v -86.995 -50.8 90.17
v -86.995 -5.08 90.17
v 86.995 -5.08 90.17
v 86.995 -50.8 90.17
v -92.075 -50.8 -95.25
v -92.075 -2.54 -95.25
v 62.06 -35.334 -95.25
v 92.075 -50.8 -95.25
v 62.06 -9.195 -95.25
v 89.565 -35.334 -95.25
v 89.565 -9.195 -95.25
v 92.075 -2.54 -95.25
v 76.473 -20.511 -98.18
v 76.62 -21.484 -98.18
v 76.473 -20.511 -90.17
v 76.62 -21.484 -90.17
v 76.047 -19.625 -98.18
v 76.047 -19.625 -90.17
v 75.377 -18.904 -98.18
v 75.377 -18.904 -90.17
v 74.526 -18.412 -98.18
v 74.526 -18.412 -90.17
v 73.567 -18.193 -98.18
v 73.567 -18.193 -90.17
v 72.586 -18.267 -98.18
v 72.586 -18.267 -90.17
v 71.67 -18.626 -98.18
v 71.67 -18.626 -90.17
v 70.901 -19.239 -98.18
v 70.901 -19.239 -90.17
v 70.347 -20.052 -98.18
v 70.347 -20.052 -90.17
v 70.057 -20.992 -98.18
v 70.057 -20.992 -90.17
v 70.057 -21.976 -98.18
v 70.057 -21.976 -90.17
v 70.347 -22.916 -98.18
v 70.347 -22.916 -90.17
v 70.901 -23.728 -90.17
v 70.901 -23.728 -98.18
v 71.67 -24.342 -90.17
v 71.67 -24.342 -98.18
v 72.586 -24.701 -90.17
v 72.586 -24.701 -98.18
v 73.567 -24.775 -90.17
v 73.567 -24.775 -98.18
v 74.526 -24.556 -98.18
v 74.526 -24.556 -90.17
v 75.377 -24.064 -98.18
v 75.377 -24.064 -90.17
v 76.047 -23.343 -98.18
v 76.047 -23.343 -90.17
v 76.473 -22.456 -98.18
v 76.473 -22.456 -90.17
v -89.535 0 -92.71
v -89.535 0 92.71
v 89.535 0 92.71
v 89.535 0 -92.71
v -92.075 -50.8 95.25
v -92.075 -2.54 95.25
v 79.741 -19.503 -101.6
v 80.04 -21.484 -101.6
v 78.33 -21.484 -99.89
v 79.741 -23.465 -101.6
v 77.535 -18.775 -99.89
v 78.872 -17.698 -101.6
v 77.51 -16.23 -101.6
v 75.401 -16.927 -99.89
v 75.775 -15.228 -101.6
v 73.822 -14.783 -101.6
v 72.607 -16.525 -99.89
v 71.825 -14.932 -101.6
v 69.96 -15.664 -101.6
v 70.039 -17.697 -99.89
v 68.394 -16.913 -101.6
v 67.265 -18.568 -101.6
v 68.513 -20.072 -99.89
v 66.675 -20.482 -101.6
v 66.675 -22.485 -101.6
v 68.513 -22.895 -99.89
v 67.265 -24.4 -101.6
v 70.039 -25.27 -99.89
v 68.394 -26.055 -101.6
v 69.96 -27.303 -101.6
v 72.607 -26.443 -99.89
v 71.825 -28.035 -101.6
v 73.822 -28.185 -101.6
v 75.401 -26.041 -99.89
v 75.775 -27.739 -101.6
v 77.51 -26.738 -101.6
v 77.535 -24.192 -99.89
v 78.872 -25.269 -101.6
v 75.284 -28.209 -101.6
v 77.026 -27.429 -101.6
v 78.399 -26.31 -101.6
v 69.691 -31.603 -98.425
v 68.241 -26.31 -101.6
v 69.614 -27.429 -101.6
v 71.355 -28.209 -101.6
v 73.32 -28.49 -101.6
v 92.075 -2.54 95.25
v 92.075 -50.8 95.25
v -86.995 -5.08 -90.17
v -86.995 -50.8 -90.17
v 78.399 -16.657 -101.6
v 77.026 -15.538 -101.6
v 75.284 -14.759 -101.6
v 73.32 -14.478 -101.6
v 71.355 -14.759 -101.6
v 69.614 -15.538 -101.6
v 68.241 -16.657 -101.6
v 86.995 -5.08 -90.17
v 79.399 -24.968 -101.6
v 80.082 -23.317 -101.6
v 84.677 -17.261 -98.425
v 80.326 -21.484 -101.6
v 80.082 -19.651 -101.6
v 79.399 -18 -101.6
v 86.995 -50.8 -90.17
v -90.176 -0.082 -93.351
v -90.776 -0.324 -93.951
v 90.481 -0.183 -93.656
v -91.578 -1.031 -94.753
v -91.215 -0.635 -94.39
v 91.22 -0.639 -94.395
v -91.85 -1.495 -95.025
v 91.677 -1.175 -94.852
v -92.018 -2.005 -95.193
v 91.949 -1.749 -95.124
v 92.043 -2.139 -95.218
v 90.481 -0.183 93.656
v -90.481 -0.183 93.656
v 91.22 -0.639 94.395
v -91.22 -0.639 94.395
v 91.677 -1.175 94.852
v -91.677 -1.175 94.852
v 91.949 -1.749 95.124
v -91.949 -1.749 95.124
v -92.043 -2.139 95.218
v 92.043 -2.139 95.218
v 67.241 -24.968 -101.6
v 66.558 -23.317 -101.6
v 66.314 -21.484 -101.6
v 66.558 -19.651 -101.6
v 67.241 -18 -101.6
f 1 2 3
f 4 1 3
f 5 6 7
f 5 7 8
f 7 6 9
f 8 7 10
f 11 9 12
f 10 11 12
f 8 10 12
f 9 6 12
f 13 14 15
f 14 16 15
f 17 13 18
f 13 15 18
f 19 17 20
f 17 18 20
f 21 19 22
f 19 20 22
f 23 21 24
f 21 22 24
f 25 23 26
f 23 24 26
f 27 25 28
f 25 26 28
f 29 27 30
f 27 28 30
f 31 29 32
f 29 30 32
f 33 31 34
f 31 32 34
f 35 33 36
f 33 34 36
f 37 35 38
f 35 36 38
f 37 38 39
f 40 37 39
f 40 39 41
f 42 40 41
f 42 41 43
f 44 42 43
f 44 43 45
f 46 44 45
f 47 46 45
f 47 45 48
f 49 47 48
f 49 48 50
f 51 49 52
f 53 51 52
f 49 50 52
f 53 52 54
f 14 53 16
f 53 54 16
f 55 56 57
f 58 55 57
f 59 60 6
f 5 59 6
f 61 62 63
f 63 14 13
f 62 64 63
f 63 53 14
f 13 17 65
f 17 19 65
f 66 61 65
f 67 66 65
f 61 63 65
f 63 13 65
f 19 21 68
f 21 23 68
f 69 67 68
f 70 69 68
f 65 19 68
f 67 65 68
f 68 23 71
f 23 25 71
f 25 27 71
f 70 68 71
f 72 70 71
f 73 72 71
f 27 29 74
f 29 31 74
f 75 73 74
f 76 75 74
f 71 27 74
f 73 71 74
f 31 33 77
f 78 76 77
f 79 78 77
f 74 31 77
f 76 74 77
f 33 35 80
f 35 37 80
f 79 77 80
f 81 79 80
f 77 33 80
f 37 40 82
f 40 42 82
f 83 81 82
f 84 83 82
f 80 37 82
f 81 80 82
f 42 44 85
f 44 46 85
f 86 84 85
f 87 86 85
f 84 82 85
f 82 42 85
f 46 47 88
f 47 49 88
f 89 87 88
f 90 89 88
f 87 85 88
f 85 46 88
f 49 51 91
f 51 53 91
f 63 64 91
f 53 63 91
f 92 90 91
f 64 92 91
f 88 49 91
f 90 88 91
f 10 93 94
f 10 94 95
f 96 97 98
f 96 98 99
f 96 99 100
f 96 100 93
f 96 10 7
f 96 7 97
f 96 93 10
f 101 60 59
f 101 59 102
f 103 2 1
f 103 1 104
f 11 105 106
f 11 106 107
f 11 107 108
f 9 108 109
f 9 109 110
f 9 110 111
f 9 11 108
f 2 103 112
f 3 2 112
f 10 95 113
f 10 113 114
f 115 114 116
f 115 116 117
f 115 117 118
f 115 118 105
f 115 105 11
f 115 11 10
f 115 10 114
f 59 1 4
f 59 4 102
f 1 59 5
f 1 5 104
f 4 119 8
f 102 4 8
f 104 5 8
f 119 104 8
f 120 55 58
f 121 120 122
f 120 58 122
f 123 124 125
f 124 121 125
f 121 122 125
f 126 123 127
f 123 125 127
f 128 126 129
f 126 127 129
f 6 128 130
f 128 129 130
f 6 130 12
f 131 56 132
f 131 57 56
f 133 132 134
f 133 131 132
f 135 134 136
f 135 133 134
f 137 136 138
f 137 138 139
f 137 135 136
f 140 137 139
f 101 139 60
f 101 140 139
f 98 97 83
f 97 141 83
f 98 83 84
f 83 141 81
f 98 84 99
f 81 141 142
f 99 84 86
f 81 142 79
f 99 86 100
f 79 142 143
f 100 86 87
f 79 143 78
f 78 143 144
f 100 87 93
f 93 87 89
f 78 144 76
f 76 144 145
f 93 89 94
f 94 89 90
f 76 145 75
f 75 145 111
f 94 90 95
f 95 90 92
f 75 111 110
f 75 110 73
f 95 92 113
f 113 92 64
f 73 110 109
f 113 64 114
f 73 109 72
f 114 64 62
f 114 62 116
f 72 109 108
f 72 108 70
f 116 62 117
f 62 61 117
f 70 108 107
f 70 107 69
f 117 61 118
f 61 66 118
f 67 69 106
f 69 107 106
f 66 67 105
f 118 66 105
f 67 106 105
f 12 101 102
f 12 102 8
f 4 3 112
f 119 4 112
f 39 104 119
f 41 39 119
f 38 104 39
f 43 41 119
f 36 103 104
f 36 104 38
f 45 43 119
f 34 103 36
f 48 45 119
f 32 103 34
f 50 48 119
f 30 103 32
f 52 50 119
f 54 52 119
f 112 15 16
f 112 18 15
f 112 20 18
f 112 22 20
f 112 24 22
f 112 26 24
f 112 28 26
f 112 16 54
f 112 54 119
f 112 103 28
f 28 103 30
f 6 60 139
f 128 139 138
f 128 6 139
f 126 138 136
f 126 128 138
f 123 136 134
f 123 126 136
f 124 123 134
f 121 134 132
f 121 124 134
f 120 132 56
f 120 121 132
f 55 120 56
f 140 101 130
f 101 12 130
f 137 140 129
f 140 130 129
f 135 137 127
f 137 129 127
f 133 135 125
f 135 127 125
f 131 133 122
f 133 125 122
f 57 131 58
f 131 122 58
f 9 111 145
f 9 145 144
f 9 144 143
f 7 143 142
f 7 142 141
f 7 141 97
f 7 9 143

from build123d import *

# Parameters (mm, degrees)
SKETCH2_W                                            = 184.15
SKETCH2_H                                            = 190.5
BOSS_EXTRUDE1_DEPTH                                  = 50.8
SHELL1_T                                             = -5.08
CSK_FOR_M6_HEX_SOCKET_COUNTERSUNK_CAP_SC_D           = 6.6
CSK_FOR_M6_HEX_SOCKET_COUNTERSUNK_CAP_SC_DEPTH       = 11.733159957
CSK_FOR_M6_HEX_SOCKET_COUNTERSUNK_CAP_SC_CSINK_D     = 13.44
CSK_FOR_M6_HEX_SOCKET_COUNTERSUNK_CAP_SC_CSINK_ANGLE = 90
CSK_FOR_M6_HEX_SOCKET_COUNTERSUNK_CAP_SC_TIP         = 1.982840043
FILLET1_R                                            = 2.54


with BuildPart() as part:
    # Sketch2 → Boss-Extrude1 (new body)
    with BuildSketch(Plane(origin=(0, 0, 0), x_dir=(1, 0, 0), z_dir=(0, 1, 0))):
        Rectangle(SKETCH2_W, SKETCH2_H)
    extrude(amount=-BOSS_EXTRUDE1_DEPTH)

    # Shell1
    shell1_openings = [part.faces().sort_by_distance(p)[0] for p in [
        (0, -50.8, 0),
    ]]
    offset(amount=SHELL1_T, openings=shell1_openings, kind=Kind.INTERSECTION)

    # Loft1: read off the stored shape, not the designer's step
    # Loft1: loft between two sections, ruled curve by curve
    loft1_from = [
        Edge.make_bspline([(68.241223487, -26.310119776, -101.6), (68.532768976, -26.616911457, -101.6), (68.863871753, -26.909333008, -101.6), (69.601572379, -27.439191099, -101.6), (70.008225028, -27.676441112, -101.6), (70.882099248, -28.069631586, -101.6), (71.349251098, -28.225355381, -101.6), (72.31767022, -28.435607084, -101.6), (72.818735502, -28.489985667, -101.6), (73.821125836, -28.489985667, -101.6), (74.322191118, -28.435607084, -101.6), (75.29061024, -28.225355381, -101.6), (75.757762089, -28.069631586, -101.6), (76.631636309, -27.676441112, -101.6), (77.038288959, -27.439191099, -101.6), (77.775989584, -26.909333008, -101.6), (78.107092362, -26.616911457, -101.6), (78.39863785, -26.310119776, -101.6)], [0, 0, 0, 0, 0.125, 0.125, 0.25, 0.25, 0.375, 0.375, 0.5, 0.5, 0.625, 0.625, 0.75, 0.75, 0.875, 0.875, 1, 1, 1, 1], 3),
        Edge.make_bspline([(78.39863785, -26.310119776, -101.6), (78.675694815, -26.018574288, -101.6), (78.937226358, -25.692808769, -101.6), (79.407739121, -24.977845102, -101.6), (79.616581189, -24.588623733, -101.6), (79.961046476, -23.760489668, -101.6), (80.096520237, -23.321639377, -101.6), (80.279103538, -22.416392759, -101.6), (80.326114413, -21.950142771, -101.6), (80.326114413, -21.017461075, -101.6), (80.279103538, -20.551211086, -101.6), (80.096520237, -19.645964468, -101.6), (79.961046476, -19.207114178, -101.6), (79.616581189, -18.378980112, -101.6), (79.407739121, -17.989758743, -101.6), (78.937226358, -17.274795077, -101.6), (78.675694815, -16.949029558, -101.6), (78.39863785, -16.657484069, -101.6)], [0, 0, 0, 0, 0.125, 0.125, 0.25, 0.25, 0.375, 0.375, 0.5, 0.5, 0.625, 0.625, 0.75, 0.75, 0.875, 0.875, 1, 1, 1, 1], 3),
        Edge.make_bspline([(68.241223487, -16.657484069, -101.6), (67.964166523, -16.949029558, -101.6), (67.70263498, -17.274795077, -101.6), (67.232122217, -17.989758743, -101.6), (67.023280149, -18.378980112, -101.6), (66.678814862, -19.207114178, -101.6), (66.543341101, -19.645964468, -101.6), (66.3607578, -20.551211086, -101.6), (66.313746925, -21.017461075, -101.6), (66.313746925, -21.950142771, -101.6), (66.3607578, -22.416392759, -101.6), (66.543341101, -23.321639377, -101.6), (66.678814862, -23.760489668, -101.6), (67.023280149, -24.588623733, -101.6), (67.232122217, -24.977845102, -101.6), (67.70263498, -25.692808769, -101.6), (67.964166523, -26.018574288, -101.6), (68.241223487, -26.310119776, -101.6)], [0, 0, 0, 0, 0.125, 0.125, 0.25, 0.25, 0.375, 0.375, 0.5, 0.5, 0.625, 0.625, 0.75, 0.75, 0.875, 0.875, 1, 1, 1, 1], 3),
        Edge.make_bspline([(78.39863785, -16.657484069, -101.6), (78.107092362, -16.350692388, -101.6), (77.775989584, -16.058270838, -101.6), (77.038288959, -15.528412746, -101.6), (76.631636309, -15.291162733, -101.6), (75.757762089, -14.89797226, -101.6), (75.29061024, -14.742248464, -101.6), (74.322191118, -14.531996762, -101.6), (73.821125836, -14.477618178, -101.6), (72.818735502, -14.477618178, -101.6), (72.31767022, -14.531996762, -101.6), (71.349251098, -14.742248464, -101.6), (70.882099248, -14.89797226, -101.6), (70.008225028, -15.291162733, -101.6), (69.601572379, -15.528412746, -101.6), (68.863871753, -16.058270838, -101.6), (68.532768976, -16.350692388, -101.6), (68.241223487, -16.657484069, -101.6)], [0, 0, 0, 0, 0.125, 0.125, 0.25, 0.25, 0.375, 0.375, 0.5, 0.5, 0.625, 0.625, 0.75, 0.75, 0.875, 0.875, 1, 1, 1, 1], 3),
    ]
    loft1_to = [
        Edge.make_bspline([(62.059516528, -35.333897225, -95.25), (63.205579438, -35.333897225, -95.25), (64.351642348, -35.333897225, -95.25), (66.643768167, -35.333897225, -95.25), (67.789831077, -35.333897225, -95.25), (70.081956897, -35.333897225, -95.25), (71.228019807, -35.333897225, -95.25), (73.520145626, -35.333897225, -95.25), (74.666208536, -35.333897225, -95.25), (76.958334356, -35.333897225, -95.25), (78.104397266, -35.333897225, -95.25), (80.396523085, -35.333897225, -95.25), (81.542585995, -35.333897225, -95.25), (83.834711815, -35.333897225, -95.25), (84.980774725, -35.333897225, -95.25), (87.272900544, -35.333897225, -95.25), (88.418963454, -35.333897225, -95.25), (89.565026364, -35.333897225, -95.25)], [0, 0, 0, 0, 0.125, 0.125, 0.25, 0.25, 0.375, 0.375, 0.5, 0.5, 0.625, 0.625, 0.75, 0.75, 0.875, 0.875, 1, 1, 1, 1], 3),
        Edge.make_bspline([(89.565026364, -35.333897225, -95.25), (89.565026364, -34.244788582, -95.25), (89.565026364, -33.15567994, -95.25), (89.565026364, -30.977462655, -95.25), (89.565026364, -29.888354013, -95.25), (89.565026364, -27.710136729, -95.25), (89.565026364, -26.621028086, -95.25), (89.565026364, -24.442810802, -95.25), (89.565026364, -23.353702159, -95.25), (89.565026364, -21.175484875, -95.25), (89.565026364, -20.086376233, -95.25), (89.565026364, -17.908158948, -95.25), (89.565026364, -16.819050306, -95.25), (89.565026364, -14.640833021, -95.25), (89.565026364, -13.551724379, -95.25), (89.565026364, -11.373507094, -95.25), (89.565026364, -10.284398452, -95.25), (89.565026364, -9.19528981, -95.25)], [0, 0, 0, 0, 0.125, 0.125, 0.25, 0.25, 0.375, 0.375, 0.5, 0.5, 0.625, 0.625, 0.75, 0.75, 0.875, 0.875, 1, 1, 1, 1], 3),
        Edge.make_bspline([(62.059516528, -9.19528981, -95.25), (62.059516528, -10.284398452, -95.25), (62.059516528, -11.373507094, -95.25), (62.059516528, -13.551724379, -95.25), (62.059516528, -14.640833021, -95.25), (62.059516528, -16.819050306, -95.25), (62.059516528, -17.908158948, -95.25), (62.059516528, -20.086376233, -95.25), (62.059516528, -21.175484875, -95.25), (62.059516528, -23.353702159, -95.25), (62.059516528, -24.442810802, -95.25), (62.059516528, -26.621028086, -95.25), (62.059516528, -27.710136729, -95.25), (62.059516528, -29.888354013, -95.25), (62.059516528, -30.977462655, -95.25), (62.059516528, -33.15567994, -95.25), (62.059516528, -34.244788582, -95.25), (62.059516528, -35.333897225, -95.25)], [0, 0, 0, 0, 0.125, 0.125, 0.25, 0.25, 0.375, 0.375, 0.5, 0.5, 0.625, 0.625, 0.75, 0.75, 0.875, 0.875, 1, 1, 1, 1], 3),
        Edge.make_bspline([(89.565026364, -9.19528981, -95.25), (88.418963454, -9.19528981, -95.25), (87.272900544, -9.19528981, -95.25), (84.980774725, -9.19528981, -95.25), (83.834711815, -9.19528981, -95.25), (81.542585995, -9.19528981, -95.25), (80.396523085, -9.19528981, -95.25), (78.104397266, -9.19528981, -95.25), (76.958334356, -9.19528981, -95.25), (74.666208536, -9.19528981, -95.25), (73.520145626, -9.19528981, -95.25), (71.228019807, -9.19528981, -95.25), (70.081956897, -9.19528981, -95.25), (67.789831077, -9.19528981, -95.25), (66.643768167, -9.19528981, -95.25), (64.351642348, -9.19528981, -95.25), (63.205579438, -9.19528981, -95.25), (62.059516528, -9.19528981, -95.25)], [0, 0, 0, 0, 0.125, 0.125, 0.25, 0.25, 0.375, 0.375, 0.5, 0.5, 0.625, 0.625, 0.75, 0.75, 0.875, 0.875, 1, 1, 1, 1], 3),
    ]
    loft1 = Solid(Shell([*[Face.make_surface_from_curves(loft1_from[k], loft1_to[k]) for k in range(4)], Face(Wire(loft1_from)), Face(Wire(loft1_to))]))
    add(loft1)

    # CSK for M6 Hex Socket Countersunk Cap Screw1
    with Locations(Plane(origin=(0, 0, -101.6), x_dir=(-1, 0, 0), z_dir=(0, 0, -1))):
        with Locations((-73.319930669, -21.483801923)):
            CounterSinkHole(CSK_FOR_M6_HEX_SOCKET_COUNTERSUNK_CAP_SC_D / 2, CSK_FOR_M6_HEX_SOCKET_COUNTERSUNK_CAP_SC_CSINK_D / 2, depth=CSK_FOR_M6_HEX_SOCKET_COUNTERSUNK_CAP_SC_DEPTH, counter_sink_angle=CSK_FOR_M6_HEX_SOCKET_COUNTERSUNK_CAP_SC_CSINK_ANGLE)
            with Locations((0, 0, -(CSK_FOR_M6_HEX_SOCKET_COUNTERSUNK_CAP_SC_DEPTH + CSK_FOR_M6_HEX_SOCKET_COUNTERSUNK_CAP_SC_TIP / 2))):  # 118° drill point
                Cone(0, CSK_FOR_M6_HEX_SOCKET_COUNTERSUNK_CAP_SC_D / 2, CSK_FOR_M6_HEX_SOCKET_COUNTERSUNK_CAP_SC_TIP, mode=Mode.SUBTRACT)

    # Fillet1
    fillet1_edges = [part.edges().sort_by_distance(p)[0] for p in [
        (0, 0, 95.25),
        (-92.075, 0, 0),
        (0, 0, -95.25),
        (92.075, 0, 0),
    ]]
    fillet(fillet1_edges, radius=FILLET1_R)


solid = part.part
